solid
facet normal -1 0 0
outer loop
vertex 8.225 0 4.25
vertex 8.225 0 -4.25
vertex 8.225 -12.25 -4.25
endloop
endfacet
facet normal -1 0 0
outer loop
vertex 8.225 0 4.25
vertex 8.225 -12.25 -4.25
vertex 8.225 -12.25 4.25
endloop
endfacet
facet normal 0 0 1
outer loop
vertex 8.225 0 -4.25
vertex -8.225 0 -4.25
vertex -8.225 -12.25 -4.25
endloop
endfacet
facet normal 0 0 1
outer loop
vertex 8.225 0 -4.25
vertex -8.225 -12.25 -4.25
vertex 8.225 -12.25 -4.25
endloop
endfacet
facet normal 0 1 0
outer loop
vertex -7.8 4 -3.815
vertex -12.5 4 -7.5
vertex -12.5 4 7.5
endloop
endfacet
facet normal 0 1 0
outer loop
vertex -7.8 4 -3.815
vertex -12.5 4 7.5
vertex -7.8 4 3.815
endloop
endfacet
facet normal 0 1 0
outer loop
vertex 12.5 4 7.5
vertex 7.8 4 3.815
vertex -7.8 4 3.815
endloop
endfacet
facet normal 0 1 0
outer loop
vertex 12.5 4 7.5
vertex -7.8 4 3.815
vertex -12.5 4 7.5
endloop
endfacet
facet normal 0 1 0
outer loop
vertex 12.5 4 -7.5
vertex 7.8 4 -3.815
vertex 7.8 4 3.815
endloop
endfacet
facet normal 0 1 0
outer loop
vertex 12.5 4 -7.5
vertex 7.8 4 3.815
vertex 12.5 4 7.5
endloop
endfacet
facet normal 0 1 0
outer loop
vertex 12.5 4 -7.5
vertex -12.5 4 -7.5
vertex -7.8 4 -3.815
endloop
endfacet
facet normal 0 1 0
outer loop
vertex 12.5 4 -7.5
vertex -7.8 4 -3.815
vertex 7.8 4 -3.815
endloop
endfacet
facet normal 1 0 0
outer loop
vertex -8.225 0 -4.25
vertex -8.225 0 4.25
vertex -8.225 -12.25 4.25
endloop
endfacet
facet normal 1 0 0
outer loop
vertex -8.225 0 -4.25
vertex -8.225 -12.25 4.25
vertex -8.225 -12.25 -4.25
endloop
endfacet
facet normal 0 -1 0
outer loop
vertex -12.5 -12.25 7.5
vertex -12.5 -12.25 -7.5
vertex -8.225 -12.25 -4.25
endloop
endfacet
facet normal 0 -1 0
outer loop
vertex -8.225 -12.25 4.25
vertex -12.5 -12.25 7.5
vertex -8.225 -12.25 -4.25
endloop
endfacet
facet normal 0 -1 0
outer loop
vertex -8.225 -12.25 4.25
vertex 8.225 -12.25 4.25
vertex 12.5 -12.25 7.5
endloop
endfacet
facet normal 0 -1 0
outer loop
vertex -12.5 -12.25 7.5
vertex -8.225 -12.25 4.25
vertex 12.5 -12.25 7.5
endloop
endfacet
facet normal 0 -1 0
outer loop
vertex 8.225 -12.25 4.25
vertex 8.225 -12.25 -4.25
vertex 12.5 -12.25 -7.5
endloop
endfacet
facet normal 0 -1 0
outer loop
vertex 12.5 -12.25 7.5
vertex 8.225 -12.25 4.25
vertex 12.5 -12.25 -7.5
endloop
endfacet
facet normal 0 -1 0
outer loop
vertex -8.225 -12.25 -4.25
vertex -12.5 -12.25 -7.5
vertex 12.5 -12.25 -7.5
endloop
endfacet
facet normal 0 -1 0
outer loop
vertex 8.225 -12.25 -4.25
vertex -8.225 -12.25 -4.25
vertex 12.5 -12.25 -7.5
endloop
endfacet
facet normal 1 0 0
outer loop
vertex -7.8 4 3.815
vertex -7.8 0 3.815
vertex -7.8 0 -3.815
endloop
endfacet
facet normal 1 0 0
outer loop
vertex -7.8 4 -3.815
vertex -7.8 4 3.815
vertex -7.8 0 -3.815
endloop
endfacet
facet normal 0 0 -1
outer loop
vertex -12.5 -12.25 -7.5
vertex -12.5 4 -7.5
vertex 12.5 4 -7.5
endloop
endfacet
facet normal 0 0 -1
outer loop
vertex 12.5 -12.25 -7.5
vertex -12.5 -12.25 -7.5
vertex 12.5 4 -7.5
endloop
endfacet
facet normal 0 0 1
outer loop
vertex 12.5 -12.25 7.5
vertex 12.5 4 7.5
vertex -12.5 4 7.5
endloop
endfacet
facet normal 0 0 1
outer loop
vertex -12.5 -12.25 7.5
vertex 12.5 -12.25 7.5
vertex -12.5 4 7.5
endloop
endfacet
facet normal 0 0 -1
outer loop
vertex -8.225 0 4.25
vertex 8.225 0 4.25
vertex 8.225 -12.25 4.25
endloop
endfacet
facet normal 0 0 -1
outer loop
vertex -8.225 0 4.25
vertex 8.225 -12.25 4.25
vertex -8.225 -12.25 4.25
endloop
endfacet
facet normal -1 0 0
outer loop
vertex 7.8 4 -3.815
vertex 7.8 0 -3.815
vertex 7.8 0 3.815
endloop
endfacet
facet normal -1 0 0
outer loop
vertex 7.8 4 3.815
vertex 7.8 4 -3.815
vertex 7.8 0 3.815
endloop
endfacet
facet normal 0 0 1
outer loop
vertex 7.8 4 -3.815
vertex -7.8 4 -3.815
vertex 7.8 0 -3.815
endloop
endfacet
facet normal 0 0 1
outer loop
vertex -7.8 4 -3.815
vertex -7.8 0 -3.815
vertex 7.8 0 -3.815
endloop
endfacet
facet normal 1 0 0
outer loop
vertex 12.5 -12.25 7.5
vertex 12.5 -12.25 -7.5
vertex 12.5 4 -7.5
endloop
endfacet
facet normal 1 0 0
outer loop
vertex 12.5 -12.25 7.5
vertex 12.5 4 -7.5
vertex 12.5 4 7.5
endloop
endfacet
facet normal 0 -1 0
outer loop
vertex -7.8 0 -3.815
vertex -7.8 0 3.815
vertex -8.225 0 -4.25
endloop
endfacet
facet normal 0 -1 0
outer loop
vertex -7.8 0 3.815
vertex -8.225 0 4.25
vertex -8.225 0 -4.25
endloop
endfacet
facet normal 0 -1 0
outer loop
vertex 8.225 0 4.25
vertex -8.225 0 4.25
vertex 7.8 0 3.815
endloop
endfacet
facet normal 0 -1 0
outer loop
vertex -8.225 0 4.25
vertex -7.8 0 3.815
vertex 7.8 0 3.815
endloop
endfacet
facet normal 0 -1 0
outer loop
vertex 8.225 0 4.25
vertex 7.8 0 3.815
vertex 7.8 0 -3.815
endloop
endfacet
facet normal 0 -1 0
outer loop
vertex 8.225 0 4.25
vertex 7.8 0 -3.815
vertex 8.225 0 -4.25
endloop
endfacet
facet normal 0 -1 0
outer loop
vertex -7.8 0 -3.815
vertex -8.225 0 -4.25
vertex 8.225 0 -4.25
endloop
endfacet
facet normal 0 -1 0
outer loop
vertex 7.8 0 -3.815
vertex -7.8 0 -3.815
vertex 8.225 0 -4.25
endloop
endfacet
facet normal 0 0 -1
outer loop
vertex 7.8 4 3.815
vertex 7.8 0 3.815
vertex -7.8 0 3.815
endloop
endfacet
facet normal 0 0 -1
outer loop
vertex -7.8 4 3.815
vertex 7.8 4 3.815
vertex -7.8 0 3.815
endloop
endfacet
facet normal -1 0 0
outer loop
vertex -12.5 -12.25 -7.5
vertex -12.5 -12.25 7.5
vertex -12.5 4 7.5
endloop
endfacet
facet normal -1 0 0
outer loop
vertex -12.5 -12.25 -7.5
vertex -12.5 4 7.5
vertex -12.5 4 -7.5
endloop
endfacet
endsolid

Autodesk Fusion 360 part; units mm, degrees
sketch "Sketch1" plane through (0, 0, 0) normal (0, 1, 0) x (1, 0, 0)
  line L0 (7.8, -3.815) -> (-7.8, -3.815)
  line L1 (-7.8, -3.815) -> (-7.8, 3.815)
  line L2 (-7.8, 3.815) -> (7.8, 3.815)
  line L3 (7.8, 3.815) -> (7.8, -3.815)
  line L4 (7.8, -3.815) -> (-7.8, 3.815) construction
  line L5 (-7.8, -3.815) -> (7.8, 3.815) construction
  line L6 (8.225, -4.25) -> (-8.225, -4.25)
  line L7 (-8.225, -4.25) -> (-8.225, 4.25)
  line L8 (-8.225, 4.25) -> (8.225, 4.25)
  line L9 (8.225, 4.25) -> (8.225, -4.25)
  line L10 (8.225, -4.25) -> (-8.225, 4.25) construction
  line L11 (-8.225, -4.25) -> (8.225, 4.25)
  line L12 (12.5, -7.5) -> (-12.5, -7.5)
  line L13 (-12.5, -7.5) -> (-12.5, 7.5)
  line L14 (-12.5, 7.5) -> (12.5, 7.5)
  line L15 (12.5, 7.5) -> (12.5, -7.5)
  line L16 (12.5, -7.5) -> (-12.5, 7.5) construction
  line L17 (-12.5, -7.5) -> (12.5, 7.5) construction
  dimension "d1" = 15.6
  dimension "d2" = 7.63
  dimension "d3" = 16.45
  dimension "d4" = 8.5
  dimension "d5" = 25
  dimension "d6" = 15
extrude "Extrude1" add sketch "Sketch1" against normal blind 12.25 makes body 1
extrude "Extrude2" add sketch "Sketch1" along normal blind 4 contours L0 L2 L3 L6 L9 L11 | L0 L1 L2 L7 L8 L11 | L12 L13 L14 L15 bodies 1
copy_body "Body->Comp1" bodies 1 removing the originals makes body 2 in component "PairHolder"
component "PairHolder" placed x (1, 0, 0) y (0, 1, 0) z (0, 0, 1) at (0, 0, 0)
